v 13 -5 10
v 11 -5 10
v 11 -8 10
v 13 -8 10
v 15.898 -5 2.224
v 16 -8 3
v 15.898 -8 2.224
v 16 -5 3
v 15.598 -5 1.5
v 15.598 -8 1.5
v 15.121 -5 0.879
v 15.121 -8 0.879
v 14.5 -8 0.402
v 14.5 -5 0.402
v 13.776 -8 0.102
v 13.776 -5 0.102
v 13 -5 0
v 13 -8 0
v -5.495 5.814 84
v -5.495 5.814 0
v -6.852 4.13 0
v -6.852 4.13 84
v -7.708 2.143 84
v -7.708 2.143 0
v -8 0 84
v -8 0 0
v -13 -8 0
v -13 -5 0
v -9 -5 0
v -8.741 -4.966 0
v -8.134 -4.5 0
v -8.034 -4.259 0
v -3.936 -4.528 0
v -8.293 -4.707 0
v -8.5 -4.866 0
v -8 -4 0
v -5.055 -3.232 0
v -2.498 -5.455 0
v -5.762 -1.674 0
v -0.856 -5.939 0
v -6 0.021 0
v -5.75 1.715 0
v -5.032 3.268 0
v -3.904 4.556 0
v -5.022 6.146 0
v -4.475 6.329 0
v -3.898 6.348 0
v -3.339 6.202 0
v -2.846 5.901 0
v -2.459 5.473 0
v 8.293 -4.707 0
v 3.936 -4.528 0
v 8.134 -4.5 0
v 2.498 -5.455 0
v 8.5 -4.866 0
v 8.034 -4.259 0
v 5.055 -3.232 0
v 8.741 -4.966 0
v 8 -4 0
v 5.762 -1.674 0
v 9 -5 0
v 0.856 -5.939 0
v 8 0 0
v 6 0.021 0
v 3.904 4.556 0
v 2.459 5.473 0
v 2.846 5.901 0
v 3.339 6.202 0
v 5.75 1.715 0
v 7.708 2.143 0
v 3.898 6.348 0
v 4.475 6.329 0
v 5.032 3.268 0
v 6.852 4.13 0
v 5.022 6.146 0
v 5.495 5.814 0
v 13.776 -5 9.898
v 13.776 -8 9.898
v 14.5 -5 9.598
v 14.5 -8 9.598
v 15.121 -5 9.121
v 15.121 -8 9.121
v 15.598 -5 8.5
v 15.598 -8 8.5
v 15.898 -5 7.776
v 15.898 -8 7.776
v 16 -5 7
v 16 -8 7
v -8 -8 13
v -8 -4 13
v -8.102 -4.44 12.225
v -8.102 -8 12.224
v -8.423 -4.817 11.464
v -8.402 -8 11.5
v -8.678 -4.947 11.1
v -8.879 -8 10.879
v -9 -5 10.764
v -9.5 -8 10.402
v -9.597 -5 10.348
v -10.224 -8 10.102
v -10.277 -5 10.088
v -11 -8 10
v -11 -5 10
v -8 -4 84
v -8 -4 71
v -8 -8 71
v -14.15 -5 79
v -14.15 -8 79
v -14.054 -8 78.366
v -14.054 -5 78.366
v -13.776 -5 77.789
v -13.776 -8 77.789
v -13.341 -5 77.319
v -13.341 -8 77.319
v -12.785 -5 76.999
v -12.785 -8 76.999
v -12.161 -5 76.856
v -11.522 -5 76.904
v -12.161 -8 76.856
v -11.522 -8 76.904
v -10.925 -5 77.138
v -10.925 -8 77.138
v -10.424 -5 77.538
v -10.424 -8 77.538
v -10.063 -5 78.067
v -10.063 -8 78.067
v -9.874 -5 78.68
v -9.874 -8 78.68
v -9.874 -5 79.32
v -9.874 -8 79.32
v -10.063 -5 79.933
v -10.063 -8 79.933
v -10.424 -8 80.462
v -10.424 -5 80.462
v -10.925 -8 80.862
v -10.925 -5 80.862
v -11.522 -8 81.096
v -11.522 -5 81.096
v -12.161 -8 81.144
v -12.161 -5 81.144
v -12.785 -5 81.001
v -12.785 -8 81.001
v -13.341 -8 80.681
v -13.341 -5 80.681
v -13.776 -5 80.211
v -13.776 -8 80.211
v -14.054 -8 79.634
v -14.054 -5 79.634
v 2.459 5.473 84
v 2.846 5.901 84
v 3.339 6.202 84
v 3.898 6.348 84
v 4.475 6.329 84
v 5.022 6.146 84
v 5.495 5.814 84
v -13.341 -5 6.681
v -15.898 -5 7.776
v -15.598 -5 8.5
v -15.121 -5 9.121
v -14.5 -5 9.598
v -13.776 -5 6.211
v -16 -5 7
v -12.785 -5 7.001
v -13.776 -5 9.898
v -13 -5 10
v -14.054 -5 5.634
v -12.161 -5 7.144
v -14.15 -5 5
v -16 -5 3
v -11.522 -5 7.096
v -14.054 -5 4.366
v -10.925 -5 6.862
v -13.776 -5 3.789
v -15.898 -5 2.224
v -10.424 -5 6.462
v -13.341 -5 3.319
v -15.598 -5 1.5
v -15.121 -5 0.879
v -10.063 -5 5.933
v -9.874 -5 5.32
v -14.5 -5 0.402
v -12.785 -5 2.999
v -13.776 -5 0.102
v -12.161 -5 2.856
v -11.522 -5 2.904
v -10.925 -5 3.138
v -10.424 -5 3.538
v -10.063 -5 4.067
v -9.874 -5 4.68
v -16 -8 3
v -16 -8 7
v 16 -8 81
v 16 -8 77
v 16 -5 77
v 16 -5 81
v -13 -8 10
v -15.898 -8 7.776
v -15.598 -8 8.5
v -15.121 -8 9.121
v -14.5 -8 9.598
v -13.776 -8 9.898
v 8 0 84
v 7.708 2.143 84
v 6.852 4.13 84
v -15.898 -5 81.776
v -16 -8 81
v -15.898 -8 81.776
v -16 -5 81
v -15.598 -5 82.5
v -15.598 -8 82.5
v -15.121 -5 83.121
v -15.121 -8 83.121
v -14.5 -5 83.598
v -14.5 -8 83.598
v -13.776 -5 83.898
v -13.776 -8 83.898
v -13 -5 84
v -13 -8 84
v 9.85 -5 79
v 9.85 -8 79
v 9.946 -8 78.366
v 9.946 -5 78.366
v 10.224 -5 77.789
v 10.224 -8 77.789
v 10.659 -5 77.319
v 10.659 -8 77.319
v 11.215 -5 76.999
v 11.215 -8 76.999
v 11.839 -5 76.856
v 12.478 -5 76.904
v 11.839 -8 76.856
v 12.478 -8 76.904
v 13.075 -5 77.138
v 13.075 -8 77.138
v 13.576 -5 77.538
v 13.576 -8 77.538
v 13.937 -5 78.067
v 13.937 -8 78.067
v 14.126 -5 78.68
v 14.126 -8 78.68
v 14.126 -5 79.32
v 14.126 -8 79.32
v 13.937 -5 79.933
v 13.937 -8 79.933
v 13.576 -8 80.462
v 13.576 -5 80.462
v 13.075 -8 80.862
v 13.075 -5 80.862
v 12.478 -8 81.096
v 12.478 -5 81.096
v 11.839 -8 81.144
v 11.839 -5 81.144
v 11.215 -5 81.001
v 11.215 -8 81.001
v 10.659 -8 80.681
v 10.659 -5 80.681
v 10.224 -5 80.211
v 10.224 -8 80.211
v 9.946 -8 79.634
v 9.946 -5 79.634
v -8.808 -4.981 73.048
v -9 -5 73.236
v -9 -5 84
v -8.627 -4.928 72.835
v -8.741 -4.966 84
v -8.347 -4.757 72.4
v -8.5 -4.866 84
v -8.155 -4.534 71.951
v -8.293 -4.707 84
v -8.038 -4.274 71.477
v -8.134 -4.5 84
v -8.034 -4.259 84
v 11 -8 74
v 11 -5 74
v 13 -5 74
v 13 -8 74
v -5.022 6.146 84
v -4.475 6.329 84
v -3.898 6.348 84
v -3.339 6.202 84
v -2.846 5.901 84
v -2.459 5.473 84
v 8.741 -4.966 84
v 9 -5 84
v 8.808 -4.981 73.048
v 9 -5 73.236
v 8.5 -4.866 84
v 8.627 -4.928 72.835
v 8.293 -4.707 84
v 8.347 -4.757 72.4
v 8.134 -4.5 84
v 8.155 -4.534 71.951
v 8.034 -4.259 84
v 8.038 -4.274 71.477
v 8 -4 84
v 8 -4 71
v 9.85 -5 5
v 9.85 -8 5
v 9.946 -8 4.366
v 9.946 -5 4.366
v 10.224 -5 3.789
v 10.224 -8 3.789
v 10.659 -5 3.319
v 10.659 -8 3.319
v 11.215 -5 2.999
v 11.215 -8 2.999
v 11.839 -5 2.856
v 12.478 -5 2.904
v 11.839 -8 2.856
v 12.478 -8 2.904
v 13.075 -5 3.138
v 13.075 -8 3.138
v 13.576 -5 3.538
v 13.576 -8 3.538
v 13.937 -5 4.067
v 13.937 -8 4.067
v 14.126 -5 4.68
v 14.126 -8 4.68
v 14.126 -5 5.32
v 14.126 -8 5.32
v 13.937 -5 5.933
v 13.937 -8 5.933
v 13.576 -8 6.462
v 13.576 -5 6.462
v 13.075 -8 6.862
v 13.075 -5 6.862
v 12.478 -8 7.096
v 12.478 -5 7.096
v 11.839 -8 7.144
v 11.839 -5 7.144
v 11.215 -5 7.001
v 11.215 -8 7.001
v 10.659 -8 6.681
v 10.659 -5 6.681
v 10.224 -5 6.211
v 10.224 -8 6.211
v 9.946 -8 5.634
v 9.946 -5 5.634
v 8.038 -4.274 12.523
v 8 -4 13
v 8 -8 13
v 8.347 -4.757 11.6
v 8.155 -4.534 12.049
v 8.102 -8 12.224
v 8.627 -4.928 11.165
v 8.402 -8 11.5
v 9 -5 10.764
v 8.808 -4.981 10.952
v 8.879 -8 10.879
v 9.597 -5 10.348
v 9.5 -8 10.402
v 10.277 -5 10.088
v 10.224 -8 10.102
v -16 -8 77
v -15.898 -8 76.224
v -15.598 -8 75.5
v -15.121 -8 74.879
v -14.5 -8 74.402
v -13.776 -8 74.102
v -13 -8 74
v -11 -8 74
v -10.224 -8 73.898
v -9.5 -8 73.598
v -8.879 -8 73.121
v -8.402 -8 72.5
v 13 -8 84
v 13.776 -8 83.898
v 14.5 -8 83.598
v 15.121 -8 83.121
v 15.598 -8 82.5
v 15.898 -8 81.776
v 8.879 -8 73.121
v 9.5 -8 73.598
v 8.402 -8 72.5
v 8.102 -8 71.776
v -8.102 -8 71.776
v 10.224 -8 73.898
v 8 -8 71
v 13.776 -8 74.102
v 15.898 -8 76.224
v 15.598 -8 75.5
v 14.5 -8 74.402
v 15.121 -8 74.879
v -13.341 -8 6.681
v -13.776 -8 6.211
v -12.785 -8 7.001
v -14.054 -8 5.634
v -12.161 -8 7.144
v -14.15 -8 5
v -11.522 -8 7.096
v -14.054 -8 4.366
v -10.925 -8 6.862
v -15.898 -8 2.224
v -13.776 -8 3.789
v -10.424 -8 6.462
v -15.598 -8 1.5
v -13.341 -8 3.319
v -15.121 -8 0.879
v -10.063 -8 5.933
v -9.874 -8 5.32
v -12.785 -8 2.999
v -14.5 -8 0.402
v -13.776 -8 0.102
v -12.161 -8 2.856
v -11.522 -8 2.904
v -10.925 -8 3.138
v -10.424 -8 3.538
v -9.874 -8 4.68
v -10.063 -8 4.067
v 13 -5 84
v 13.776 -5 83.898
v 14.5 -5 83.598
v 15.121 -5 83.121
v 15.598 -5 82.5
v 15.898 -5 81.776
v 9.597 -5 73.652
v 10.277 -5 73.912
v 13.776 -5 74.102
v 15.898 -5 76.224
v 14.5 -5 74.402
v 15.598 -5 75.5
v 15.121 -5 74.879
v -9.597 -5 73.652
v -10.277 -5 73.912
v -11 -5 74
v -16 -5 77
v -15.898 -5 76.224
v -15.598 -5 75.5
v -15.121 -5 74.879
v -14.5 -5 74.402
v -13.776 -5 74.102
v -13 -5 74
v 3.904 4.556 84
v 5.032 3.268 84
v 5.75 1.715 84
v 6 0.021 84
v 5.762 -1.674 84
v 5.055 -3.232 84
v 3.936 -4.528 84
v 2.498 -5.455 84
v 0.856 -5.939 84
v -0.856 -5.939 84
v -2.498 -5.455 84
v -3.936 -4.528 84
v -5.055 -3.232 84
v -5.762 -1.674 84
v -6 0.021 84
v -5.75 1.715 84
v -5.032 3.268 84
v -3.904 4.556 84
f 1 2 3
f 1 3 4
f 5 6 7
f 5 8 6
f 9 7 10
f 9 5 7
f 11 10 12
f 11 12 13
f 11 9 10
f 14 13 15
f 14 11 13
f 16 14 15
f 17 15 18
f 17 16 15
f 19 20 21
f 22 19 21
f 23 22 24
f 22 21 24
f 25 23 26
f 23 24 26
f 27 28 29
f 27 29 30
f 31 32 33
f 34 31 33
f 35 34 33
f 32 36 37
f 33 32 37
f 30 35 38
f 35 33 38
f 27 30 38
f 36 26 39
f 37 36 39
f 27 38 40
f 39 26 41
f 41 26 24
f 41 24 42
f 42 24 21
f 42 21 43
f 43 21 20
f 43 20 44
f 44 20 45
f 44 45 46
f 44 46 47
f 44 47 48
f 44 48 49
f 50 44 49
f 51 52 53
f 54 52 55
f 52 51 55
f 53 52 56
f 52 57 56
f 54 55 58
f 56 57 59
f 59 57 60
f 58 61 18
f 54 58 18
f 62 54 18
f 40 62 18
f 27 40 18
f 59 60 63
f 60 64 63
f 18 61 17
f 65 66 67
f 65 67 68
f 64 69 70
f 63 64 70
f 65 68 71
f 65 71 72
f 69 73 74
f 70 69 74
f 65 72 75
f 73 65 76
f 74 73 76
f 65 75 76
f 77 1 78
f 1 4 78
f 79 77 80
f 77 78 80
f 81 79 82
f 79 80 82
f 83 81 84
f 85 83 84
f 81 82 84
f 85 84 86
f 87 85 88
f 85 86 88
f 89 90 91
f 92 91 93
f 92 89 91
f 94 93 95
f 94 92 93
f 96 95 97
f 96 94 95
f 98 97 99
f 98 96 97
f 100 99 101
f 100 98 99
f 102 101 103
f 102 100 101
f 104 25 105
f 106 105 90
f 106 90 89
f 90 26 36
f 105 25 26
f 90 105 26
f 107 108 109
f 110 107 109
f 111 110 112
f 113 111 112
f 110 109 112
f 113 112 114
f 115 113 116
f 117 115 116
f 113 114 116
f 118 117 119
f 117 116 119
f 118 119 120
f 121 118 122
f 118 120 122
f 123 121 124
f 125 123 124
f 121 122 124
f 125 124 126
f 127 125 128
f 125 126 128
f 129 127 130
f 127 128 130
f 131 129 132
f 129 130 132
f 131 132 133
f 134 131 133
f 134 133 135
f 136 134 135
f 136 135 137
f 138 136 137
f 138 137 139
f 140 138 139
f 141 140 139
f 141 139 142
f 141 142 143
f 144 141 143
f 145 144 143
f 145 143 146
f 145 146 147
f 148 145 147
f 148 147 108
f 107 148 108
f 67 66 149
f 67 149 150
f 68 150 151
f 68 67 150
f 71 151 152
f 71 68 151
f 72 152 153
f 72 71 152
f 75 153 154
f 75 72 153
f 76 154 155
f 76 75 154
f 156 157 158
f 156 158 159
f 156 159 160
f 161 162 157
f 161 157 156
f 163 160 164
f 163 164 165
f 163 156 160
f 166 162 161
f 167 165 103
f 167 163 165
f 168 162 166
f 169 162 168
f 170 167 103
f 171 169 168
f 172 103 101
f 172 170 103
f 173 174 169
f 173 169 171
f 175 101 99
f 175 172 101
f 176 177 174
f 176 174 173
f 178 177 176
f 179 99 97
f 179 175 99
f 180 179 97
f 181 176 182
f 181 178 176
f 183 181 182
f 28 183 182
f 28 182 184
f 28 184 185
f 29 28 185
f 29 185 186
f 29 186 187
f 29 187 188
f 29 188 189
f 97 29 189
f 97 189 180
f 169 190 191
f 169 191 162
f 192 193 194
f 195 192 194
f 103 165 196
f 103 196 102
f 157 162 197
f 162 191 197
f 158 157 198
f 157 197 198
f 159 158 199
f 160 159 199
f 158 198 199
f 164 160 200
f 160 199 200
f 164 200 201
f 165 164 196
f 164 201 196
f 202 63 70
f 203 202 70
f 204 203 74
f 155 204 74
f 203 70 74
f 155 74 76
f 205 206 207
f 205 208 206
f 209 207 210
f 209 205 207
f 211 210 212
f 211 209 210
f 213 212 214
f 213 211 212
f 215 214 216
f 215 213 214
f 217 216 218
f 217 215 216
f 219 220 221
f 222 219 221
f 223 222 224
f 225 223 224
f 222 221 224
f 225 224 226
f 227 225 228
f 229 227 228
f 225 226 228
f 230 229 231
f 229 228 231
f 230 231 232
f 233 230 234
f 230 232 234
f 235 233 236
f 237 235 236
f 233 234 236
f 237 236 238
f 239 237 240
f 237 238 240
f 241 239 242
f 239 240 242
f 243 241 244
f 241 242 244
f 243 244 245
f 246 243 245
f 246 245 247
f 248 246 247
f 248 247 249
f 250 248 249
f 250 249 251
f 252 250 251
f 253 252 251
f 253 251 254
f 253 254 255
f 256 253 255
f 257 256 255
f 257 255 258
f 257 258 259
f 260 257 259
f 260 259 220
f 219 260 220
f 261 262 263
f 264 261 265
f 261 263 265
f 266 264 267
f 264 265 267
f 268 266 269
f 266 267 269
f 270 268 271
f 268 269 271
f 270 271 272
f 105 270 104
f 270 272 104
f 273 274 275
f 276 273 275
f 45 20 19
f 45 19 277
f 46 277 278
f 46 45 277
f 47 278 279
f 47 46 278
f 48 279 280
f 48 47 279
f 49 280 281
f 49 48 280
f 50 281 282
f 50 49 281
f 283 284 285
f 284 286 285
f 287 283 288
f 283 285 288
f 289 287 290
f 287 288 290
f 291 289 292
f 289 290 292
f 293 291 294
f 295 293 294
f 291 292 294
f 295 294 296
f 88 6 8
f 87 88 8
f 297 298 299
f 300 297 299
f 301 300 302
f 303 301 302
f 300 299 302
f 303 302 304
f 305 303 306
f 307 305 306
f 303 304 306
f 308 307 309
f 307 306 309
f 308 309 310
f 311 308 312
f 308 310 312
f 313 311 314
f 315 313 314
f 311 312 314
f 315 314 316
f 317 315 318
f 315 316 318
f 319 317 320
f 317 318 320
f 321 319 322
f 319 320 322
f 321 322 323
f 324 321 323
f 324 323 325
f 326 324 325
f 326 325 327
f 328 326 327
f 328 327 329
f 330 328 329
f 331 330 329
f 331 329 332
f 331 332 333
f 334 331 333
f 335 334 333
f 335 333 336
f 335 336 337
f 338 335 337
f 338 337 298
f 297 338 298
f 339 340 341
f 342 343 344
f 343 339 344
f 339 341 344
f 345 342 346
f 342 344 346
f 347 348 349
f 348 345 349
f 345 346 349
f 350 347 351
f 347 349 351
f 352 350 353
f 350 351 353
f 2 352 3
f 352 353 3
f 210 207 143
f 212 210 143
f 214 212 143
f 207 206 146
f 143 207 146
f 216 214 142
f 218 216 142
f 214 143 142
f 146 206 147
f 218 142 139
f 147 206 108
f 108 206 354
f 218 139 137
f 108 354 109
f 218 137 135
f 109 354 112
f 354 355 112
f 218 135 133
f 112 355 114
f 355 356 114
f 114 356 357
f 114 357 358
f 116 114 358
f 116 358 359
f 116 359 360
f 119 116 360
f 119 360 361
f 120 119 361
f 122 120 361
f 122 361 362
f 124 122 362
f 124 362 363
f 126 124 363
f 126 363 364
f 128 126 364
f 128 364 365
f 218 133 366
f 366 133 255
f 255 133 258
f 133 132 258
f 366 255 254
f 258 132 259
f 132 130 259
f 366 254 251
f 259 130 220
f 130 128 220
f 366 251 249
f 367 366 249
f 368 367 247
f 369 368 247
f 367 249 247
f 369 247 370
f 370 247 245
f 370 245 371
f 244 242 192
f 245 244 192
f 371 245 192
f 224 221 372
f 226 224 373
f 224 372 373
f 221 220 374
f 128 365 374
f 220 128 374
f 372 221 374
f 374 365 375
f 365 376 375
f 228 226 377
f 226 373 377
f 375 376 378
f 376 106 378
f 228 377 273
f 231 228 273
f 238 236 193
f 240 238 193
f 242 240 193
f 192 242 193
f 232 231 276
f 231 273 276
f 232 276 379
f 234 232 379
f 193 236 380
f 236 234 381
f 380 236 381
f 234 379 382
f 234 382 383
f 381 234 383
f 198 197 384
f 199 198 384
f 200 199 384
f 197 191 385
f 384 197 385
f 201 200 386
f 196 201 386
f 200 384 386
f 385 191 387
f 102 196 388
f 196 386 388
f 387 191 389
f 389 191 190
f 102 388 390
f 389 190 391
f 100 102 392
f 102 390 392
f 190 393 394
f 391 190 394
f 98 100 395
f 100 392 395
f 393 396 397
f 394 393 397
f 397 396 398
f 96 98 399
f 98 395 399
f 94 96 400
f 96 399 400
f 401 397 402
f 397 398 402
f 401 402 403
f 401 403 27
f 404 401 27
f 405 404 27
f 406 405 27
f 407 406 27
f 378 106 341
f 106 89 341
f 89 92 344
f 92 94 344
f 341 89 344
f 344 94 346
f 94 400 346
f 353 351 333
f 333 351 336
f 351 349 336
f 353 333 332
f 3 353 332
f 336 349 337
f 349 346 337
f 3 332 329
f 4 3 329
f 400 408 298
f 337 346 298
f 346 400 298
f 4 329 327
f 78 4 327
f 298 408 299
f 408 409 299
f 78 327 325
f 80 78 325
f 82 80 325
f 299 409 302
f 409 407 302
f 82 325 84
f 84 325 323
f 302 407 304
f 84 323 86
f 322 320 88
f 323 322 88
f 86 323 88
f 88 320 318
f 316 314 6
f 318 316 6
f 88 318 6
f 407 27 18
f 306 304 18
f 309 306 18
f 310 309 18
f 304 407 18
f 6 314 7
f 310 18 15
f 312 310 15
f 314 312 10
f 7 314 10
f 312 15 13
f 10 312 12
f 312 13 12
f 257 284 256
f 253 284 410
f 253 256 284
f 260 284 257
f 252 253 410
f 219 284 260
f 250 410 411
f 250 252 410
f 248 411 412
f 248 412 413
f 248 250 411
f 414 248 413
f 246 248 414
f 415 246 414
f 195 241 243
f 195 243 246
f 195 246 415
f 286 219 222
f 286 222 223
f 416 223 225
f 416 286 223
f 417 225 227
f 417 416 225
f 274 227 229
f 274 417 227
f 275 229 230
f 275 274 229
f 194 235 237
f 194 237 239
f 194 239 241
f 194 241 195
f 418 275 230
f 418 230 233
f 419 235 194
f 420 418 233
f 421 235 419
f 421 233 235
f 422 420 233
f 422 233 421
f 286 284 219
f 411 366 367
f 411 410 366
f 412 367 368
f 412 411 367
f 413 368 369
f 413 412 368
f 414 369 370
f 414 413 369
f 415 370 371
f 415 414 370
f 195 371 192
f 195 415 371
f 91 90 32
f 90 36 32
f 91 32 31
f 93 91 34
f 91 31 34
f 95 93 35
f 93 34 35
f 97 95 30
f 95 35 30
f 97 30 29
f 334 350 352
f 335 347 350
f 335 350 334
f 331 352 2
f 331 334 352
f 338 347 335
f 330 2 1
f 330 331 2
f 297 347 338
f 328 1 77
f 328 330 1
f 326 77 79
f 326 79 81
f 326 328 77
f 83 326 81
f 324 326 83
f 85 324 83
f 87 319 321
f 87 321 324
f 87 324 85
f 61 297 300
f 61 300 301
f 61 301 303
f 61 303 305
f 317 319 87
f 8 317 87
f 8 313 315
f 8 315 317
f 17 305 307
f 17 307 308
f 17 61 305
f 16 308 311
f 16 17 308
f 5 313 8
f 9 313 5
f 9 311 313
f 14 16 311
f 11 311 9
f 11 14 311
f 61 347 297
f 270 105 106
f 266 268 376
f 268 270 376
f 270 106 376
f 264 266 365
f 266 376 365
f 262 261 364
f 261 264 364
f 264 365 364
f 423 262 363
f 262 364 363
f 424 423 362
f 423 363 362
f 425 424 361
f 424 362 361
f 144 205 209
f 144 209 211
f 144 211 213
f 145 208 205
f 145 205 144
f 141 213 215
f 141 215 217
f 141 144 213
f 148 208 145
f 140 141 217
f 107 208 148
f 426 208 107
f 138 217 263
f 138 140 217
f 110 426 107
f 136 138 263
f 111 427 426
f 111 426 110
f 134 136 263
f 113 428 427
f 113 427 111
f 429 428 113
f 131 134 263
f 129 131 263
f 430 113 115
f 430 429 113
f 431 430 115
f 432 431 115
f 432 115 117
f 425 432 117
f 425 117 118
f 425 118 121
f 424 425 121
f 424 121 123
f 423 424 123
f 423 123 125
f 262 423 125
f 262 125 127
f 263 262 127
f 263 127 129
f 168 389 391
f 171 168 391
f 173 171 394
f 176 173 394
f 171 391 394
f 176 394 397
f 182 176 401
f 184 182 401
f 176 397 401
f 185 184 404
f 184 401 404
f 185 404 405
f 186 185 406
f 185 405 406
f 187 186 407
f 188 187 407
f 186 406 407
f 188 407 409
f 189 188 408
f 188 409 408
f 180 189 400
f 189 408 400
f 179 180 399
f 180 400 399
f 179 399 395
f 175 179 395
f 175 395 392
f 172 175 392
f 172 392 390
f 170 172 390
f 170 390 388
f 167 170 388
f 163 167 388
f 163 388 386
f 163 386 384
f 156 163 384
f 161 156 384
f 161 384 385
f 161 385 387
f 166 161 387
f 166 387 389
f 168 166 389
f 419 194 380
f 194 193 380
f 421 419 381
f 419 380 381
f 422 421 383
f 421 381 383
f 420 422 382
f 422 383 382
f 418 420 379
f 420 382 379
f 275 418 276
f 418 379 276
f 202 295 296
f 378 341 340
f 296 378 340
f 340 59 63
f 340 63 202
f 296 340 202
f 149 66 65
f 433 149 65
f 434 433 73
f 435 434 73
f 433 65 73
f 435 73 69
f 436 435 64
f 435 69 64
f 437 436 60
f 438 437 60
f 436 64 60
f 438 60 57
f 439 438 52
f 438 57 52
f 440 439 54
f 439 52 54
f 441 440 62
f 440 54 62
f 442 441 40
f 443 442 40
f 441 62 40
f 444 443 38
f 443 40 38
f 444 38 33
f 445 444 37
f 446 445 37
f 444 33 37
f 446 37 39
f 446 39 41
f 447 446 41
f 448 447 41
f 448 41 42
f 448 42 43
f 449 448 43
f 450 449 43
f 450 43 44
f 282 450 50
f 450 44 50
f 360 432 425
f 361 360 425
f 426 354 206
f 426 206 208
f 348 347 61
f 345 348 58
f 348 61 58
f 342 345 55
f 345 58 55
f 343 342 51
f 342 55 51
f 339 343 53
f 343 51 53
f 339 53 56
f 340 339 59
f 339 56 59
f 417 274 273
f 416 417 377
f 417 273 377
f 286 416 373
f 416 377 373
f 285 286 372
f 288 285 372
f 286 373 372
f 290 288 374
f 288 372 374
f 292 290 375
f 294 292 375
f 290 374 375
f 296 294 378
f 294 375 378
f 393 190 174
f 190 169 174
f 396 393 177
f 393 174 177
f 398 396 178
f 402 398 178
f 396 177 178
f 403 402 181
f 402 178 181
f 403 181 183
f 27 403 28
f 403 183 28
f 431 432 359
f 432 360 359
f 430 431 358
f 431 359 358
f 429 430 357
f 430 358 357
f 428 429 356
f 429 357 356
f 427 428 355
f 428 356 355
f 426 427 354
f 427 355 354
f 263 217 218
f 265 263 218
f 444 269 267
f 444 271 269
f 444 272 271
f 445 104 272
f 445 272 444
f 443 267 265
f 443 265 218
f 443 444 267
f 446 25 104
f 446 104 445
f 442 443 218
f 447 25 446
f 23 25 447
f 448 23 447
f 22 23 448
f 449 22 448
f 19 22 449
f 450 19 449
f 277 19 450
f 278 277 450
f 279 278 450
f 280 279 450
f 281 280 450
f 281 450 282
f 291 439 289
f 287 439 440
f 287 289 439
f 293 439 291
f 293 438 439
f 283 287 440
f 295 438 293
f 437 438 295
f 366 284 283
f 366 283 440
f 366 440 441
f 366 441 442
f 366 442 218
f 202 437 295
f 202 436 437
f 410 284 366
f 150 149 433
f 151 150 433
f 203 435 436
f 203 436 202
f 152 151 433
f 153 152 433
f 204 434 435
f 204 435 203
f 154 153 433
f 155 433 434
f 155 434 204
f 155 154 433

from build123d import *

# Parameters (mm, degrees)
F0_W        = 8
F0_H        = 3
F1_DEPTH    = 84
F3_D        = 4.3
F3_DEPTH    = 16
F3_START    = 5
F3_TIP      = 1.2918503309
F2_W        = 8
F2_H        = 64
F4_DEPTH    = 25
F5_R        = 3
F6_R        = 1
F7_T1_DEPTH = 101.4328702047


# Not quite as in the source:
# - a fillet or chamfer that OpenCascade refuses, or shapes differently, is made with other operations: its cross-section is extruded or revolved along the edge and cut away or added


with BuildPart() as f1:
    # F0 (on Top) → F1 (new body)
    with BuildSketch(Plane.XY):
        with Locations((-12, -6.5)):
            Rectangle(F0_W, F0_H)
        with BuildLine():
            ThreePointArc((0, -8), (-5.6568542495, -5.6568542495), (-8, 0))
            Line((-8, 0), (-8, -5))
            Line((-8, -5), (-8, -8))
            Line((-8, -8), (-2.5, -8))
            Line((-2.5, -8), (0, -8))
        make_face()
        with BuildLine():
            ThreePointArc((2.4590163934, 5.4729551777), (0, -6), (-2.4590163934, 5.4729551777))
            Line((-2.4590163934, 5.4729551777), (-2.5, 7.5993420768))
            ThreePointArc((-2.5, 7.5993420768), (-6.4807406984, 4.6904157598), (-8, 0))
            ThreePointArc((-8, 0), (-5.6568542495, -5.6568542495), (0, -8))
            ThreePointArc((0, -8), (5.6568542495, -5.6568542495), (8, 0))
            ThreePointArc((8, 0), (6.4807406984, 4.6904157598), (2.5, 7.5993420768))
            Line((2.5, 7.5993420768), (2.4590163934, 5.4729551777))
        make_face()
        with BuildLine():
            Line((8, -5), (8, 0))
            ThreePointArc((8, 0), (5.6568542495, -5.6568542495), (0, -8))
            Line((0, -8), (2.5, -8))
            Line((2.5, -8), (8, -8))
            Line((8, -8), (8, -5))
        make_face()
        with Locations((12, -6.5)):
            Rectangle(F0_W, F0_H)
    extrude(amount=F1_DEPTH)

    # F3
    # its depths count from where the whole tool has entered the part; down to there all is cleared
    with Locations(Plane(origin=(0, 0, 0), x_dir=(1, 0, 0), z_dir=(0, 1, 0)).offset(-F3_START)):
        with Locations((12, -5), (-12, -5), (12, -79), (-12, -79)):
            Hole(F3_D / 2, depth=F3_DEPTH)
            with Locations((0, 0, -(F3_DEPTH + F3_TIP / 2))):  # 118° drill point
                Cone(0, F3_D / 2, F3_TIP, mode=Mode.SUBTRACT)

    # F2 (on Front) → F4 (cut)
    with BuildSketch(Plane.XZ):
        with Locations((12, 42)):
            Rectangle(F2_W, F2_H)
        with Locations((-12, 42)):
            Rectangle(F2_W, F2_H)
    extrude(amount=F4_DEPTH, mode=Mode.SUBTRACT)

    # F5
    f5_edges = [f1.edges().sort_by_distance(p)[0] for p in [
        (-16, -6.5, 84),
        (-16, -6.5, 74),
        (16, -6.5, 84),
        (16, -6.5, 74),
        (-16, -6.5, 0),
        (16, -6.5, 0),
        (16, -6.5, 10),
        (-16, -6.5, 10),
        (-8, -6.5, 10),
        (8, -6.5, 10),
        (-8, -6.5, 74),
        (8, -6.5, 74),
    ]]
    fillet(f5_edges, radius=F5_R)

    # F6
    f6_edges = [f1.edges().sort_by_distance(p)[0] for p in [
        (-8, -5, 5),
        (8, -5, 5),
        (8, -5, 79),
        (-8, -5, 79),
    ]]
    fillet(f6_edges, radius=F6_R)

    # F7: fillet of radius 2 on 2 edges, made by hand

    # F7_s2 → F7_t1 (cut)
    with BuildSketch(Plane.XY.offset(-8.7164351024)):
        with BuildLine():
            ThreePointArc((2.4590163934, 5.4729551777), (3.8977705539, 6.3481743906), (5.4949420866, 5.8142593221))
            ThreePointArc((5.4949420866, 5.8142593221), (4.0959009817, 6.8719426036), (2.5, 7.5993420768))
            Line((2.5, 7.5993420768), (2.4590163934, 5.4729551777))
        make_face()
        with BuildLine():
            ThreePointArc((-5.4949420866, 5.8142593221), (-3.8977705539, 6.3481743906), (-2.4590163934, 5.4729551777))
            Line((-2.4590163934, 5.4729551777), (-2.5, 7.5993420768))
            ThreePointArc((-2.5, 7.5993420768), (-4.0959009817, 6.8719426036), (-5.4949420866, 5.8142593221))
        make_face()
    extrude(amount=F7_T1_DEPTH, mode=Mode.SUBTRACT)


solid = f1.part
